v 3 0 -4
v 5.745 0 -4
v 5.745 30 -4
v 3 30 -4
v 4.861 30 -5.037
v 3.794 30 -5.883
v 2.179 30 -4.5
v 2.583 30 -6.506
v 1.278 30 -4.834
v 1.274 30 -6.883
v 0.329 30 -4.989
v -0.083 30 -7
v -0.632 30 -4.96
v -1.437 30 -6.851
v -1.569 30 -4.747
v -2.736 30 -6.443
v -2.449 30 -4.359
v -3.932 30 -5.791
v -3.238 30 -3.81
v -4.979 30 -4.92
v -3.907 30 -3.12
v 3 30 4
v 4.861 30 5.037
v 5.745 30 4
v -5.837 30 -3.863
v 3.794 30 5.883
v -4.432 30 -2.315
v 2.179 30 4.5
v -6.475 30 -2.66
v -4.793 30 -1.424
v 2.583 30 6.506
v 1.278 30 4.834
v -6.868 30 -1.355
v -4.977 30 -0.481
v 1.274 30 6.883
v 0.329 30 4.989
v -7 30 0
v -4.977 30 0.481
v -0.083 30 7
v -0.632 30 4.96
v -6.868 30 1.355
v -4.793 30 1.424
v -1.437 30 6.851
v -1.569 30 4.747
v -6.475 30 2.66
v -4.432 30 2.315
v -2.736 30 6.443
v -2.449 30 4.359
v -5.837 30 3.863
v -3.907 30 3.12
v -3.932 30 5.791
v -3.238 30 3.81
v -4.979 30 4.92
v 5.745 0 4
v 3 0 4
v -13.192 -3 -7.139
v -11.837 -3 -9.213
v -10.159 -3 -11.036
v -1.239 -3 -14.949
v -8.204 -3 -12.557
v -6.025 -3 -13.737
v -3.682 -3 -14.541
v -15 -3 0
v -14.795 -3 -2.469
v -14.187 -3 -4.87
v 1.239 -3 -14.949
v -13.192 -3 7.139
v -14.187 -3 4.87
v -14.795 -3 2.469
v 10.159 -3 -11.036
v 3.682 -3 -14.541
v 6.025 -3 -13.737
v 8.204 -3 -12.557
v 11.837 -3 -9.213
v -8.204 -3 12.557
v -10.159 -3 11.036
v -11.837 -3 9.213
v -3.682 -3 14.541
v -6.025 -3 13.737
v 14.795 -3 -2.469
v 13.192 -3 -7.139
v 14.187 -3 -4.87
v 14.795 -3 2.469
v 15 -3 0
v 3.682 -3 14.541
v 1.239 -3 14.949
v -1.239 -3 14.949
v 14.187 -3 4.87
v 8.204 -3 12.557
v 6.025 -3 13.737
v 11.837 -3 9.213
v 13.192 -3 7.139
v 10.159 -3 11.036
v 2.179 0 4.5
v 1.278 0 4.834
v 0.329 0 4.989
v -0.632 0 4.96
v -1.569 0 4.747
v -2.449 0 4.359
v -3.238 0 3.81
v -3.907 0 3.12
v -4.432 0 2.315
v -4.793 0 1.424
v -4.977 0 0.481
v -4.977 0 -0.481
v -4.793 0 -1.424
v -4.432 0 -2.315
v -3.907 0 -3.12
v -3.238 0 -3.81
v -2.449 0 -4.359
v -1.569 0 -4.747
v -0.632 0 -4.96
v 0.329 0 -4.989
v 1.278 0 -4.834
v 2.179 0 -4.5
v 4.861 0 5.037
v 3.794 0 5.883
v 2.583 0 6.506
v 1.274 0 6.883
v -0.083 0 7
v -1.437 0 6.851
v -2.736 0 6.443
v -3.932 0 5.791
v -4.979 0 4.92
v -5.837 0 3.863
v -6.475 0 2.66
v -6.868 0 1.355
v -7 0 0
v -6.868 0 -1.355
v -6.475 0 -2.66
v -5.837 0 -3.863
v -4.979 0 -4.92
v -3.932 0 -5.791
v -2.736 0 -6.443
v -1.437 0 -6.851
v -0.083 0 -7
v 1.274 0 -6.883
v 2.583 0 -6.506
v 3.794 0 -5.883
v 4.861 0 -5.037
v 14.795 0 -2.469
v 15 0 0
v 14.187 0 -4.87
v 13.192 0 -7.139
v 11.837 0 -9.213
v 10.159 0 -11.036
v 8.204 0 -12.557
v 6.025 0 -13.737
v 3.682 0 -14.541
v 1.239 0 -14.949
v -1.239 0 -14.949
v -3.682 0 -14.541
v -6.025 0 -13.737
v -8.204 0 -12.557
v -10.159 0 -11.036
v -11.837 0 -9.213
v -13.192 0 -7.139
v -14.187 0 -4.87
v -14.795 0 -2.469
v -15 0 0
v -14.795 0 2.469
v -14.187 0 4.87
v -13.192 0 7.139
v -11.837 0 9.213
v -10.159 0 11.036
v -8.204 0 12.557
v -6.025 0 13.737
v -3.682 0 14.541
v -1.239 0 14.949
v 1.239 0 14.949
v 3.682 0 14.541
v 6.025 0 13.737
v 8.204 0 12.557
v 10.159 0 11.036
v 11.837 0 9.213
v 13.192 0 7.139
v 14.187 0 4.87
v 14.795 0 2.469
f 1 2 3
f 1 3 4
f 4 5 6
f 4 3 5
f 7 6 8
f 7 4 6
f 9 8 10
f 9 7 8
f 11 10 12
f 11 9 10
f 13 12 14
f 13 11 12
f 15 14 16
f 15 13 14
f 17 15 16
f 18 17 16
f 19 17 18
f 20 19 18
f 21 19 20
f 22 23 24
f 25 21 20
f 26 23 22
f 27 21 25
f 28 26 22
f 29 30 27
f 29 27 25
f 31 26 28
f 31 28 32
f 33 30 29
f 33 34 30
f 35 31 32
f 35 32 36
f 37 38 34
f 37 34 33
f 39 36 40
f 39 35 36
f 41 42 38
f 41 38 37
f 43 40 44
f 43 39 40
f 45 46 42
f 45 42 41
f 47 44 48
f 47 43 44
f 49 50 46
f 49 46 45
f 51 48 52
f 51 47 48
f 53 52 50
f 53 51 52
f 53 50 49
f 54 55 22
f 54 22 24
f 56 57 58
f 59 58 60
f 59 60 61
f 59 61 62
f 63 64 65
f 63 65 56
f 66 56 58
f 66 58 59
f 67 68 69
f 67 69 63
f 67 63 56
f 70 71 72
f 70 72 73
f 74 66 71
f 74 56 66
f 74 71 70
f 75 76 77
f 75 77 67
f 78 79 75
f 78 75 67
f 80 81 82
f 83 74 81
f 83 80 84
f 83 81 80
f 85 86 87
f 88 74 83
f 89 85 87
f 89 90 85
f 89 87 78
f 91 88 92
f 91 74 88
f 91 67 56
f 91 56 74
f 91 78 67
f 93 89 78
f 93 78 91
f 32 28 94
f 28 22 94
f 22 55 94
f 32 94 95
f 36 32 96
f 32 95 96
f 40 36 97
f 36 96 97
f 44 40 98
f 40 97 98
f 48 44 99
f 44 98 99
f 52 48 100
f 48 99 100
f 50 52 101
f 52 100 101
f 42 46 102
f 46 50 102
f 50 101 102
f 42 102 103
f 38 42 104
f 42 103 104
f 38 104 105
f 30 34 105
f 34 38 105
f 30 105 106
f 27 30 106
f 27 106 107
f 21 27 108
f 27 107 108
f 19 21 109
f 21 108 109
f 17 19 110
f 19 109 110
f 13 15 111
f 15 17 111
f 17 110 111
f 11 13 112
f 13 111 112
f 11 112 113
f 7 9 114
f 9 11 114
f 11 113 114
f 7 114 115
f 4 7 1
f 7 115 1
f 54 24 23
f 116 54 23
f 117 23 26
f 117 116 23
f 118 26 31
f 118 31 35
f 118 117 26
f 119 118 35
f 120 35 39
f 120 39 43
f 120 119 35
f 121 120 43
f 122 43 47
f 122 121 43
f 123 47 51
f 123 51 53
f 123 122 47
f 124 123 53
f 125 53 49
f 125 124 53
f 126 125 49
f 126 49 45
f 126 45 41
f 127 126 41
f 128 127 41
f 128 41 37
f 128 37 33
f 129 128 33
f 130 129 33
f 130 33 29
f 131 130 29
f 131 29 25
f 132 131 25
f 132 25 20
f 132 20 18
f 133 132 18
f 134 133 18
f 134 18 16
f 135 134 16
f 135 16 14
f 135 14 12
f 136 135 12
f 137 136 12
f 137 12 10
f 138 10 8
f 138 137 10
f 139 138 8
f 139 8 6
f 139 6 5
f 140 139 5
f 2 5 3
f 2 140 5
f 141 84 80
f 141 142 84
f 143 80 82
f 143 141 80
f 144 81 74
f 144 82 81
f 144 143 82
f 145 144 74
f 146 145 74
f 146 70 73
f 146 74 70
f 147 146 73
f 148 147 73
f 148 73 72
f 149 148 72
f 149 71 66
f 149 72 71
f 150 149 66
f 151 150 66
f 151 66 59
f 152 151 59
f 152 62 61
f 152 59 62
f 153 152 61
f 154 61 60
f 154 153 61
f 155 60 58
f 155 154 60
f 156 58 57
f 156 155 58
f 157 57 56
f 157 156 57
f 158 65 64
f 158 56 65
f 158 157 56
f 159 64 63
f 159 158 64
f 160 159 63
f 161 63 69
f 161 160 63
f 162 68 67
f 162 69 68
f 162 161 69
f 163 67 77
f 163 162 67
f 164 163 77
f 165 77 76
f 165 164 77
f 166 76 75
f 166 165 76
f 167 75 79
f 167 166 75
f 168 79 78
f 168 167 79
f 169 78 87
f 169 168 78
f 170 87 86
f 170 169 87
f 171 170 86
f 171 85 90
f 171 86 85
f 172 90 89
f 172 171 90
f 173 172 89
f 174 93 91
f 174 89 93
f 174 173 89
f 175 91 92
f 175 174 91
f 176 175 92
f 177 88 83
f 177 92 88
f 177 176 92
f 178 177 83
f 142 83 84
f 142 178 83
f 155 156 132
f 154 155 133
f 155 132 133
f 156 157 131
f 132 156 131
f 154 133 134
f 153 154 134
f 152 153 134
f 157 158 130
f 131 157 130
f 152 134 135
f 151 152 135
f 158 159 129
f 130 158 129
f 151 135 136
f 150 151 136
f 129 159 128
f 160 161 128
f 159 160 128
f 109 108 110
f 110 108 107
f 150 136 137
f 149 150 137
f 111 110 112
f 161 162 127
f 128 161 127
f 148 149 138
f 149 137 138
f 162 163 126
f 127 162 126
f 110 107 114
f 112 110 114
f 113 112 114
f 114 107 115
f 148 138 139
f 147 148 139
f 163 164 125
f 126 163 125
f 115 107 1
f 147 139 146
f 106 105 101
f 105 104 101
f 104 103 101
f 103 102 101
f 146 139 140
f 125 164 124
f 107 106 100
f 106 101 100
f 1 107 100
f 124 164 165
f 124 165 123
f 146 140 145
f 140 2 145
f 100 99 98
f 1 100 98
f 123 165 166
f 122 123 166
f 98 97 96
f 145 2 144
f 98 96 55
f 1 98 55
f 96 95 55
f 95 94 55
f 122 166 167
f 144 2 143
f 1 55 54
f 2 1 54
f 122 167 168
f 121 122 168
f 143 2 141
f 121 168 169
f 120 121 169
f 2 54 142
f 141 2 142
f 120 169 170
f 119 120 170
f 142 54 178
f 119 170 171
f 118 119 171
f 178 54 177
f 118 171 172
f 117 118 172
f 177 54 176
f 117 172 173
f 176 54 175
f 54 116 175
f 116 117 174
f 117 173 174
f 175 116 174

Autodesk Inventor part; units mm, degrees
ref_plane "YZ Plane" through (0, 0, 0) normal (1, 0, 0) x (0, 1, 0)
ref_plane "XZ Plane" through (0, 0, 0) normal (0, 1, 0) x (-1, 0, 0)
ref_plane "XY Plane" through (0, 0, 0) normal (0, 0, 1) x (1, 0, 0)
sketch "Sketch1" plane through (0, 0, 0) normal (0, 1, 0) x (-1, 0, 0)
  point P0 (0, 0)
sketch "Sketch2" plane through (0, 0, 0) normal (0, 1, 0) x (-1, 0, 0)
  circle A0 centre (0, 0) radius 5
  circle A1 centre (0, 0) radius 7
  line L0 (-0.0083, 4) -> (-10.0083, 4)
  line L1 (-10.0083, 4) -> (-10.0083, -4)
  line L2 (-10.0083, -4) -> (-0.0083, -4)
  line L3 (-0.0083, -4) -> (-0.0083, 4)
  point P0 (-3, -4)
  point P1 (-5.7446, -4)
  point P2 (-5.7446, 4)
  point P3 (-3, 4)
  dimension "d0" = 10
  dimension "d1" = 14
  dimension "d2" = 10
  dimension "d3" = 8
  dimension "d4" = 3
extrude "Extrusion1" add sketch "Sketch2" along normal blind 30 contours A0 L0 A1 L2 picked at (-4.4748, -4.4019)
sketch "Sketch3" plane through (0, 0, 0) normal (0, -1, 0) x (1, 0, 0)
  circle A0 centre (0, 0) radius 15
  dimension "d7" = 30
extrude "Extrusion2" add sketch "Sketch3" along normal blind 3
properties part number "fsrBase"
